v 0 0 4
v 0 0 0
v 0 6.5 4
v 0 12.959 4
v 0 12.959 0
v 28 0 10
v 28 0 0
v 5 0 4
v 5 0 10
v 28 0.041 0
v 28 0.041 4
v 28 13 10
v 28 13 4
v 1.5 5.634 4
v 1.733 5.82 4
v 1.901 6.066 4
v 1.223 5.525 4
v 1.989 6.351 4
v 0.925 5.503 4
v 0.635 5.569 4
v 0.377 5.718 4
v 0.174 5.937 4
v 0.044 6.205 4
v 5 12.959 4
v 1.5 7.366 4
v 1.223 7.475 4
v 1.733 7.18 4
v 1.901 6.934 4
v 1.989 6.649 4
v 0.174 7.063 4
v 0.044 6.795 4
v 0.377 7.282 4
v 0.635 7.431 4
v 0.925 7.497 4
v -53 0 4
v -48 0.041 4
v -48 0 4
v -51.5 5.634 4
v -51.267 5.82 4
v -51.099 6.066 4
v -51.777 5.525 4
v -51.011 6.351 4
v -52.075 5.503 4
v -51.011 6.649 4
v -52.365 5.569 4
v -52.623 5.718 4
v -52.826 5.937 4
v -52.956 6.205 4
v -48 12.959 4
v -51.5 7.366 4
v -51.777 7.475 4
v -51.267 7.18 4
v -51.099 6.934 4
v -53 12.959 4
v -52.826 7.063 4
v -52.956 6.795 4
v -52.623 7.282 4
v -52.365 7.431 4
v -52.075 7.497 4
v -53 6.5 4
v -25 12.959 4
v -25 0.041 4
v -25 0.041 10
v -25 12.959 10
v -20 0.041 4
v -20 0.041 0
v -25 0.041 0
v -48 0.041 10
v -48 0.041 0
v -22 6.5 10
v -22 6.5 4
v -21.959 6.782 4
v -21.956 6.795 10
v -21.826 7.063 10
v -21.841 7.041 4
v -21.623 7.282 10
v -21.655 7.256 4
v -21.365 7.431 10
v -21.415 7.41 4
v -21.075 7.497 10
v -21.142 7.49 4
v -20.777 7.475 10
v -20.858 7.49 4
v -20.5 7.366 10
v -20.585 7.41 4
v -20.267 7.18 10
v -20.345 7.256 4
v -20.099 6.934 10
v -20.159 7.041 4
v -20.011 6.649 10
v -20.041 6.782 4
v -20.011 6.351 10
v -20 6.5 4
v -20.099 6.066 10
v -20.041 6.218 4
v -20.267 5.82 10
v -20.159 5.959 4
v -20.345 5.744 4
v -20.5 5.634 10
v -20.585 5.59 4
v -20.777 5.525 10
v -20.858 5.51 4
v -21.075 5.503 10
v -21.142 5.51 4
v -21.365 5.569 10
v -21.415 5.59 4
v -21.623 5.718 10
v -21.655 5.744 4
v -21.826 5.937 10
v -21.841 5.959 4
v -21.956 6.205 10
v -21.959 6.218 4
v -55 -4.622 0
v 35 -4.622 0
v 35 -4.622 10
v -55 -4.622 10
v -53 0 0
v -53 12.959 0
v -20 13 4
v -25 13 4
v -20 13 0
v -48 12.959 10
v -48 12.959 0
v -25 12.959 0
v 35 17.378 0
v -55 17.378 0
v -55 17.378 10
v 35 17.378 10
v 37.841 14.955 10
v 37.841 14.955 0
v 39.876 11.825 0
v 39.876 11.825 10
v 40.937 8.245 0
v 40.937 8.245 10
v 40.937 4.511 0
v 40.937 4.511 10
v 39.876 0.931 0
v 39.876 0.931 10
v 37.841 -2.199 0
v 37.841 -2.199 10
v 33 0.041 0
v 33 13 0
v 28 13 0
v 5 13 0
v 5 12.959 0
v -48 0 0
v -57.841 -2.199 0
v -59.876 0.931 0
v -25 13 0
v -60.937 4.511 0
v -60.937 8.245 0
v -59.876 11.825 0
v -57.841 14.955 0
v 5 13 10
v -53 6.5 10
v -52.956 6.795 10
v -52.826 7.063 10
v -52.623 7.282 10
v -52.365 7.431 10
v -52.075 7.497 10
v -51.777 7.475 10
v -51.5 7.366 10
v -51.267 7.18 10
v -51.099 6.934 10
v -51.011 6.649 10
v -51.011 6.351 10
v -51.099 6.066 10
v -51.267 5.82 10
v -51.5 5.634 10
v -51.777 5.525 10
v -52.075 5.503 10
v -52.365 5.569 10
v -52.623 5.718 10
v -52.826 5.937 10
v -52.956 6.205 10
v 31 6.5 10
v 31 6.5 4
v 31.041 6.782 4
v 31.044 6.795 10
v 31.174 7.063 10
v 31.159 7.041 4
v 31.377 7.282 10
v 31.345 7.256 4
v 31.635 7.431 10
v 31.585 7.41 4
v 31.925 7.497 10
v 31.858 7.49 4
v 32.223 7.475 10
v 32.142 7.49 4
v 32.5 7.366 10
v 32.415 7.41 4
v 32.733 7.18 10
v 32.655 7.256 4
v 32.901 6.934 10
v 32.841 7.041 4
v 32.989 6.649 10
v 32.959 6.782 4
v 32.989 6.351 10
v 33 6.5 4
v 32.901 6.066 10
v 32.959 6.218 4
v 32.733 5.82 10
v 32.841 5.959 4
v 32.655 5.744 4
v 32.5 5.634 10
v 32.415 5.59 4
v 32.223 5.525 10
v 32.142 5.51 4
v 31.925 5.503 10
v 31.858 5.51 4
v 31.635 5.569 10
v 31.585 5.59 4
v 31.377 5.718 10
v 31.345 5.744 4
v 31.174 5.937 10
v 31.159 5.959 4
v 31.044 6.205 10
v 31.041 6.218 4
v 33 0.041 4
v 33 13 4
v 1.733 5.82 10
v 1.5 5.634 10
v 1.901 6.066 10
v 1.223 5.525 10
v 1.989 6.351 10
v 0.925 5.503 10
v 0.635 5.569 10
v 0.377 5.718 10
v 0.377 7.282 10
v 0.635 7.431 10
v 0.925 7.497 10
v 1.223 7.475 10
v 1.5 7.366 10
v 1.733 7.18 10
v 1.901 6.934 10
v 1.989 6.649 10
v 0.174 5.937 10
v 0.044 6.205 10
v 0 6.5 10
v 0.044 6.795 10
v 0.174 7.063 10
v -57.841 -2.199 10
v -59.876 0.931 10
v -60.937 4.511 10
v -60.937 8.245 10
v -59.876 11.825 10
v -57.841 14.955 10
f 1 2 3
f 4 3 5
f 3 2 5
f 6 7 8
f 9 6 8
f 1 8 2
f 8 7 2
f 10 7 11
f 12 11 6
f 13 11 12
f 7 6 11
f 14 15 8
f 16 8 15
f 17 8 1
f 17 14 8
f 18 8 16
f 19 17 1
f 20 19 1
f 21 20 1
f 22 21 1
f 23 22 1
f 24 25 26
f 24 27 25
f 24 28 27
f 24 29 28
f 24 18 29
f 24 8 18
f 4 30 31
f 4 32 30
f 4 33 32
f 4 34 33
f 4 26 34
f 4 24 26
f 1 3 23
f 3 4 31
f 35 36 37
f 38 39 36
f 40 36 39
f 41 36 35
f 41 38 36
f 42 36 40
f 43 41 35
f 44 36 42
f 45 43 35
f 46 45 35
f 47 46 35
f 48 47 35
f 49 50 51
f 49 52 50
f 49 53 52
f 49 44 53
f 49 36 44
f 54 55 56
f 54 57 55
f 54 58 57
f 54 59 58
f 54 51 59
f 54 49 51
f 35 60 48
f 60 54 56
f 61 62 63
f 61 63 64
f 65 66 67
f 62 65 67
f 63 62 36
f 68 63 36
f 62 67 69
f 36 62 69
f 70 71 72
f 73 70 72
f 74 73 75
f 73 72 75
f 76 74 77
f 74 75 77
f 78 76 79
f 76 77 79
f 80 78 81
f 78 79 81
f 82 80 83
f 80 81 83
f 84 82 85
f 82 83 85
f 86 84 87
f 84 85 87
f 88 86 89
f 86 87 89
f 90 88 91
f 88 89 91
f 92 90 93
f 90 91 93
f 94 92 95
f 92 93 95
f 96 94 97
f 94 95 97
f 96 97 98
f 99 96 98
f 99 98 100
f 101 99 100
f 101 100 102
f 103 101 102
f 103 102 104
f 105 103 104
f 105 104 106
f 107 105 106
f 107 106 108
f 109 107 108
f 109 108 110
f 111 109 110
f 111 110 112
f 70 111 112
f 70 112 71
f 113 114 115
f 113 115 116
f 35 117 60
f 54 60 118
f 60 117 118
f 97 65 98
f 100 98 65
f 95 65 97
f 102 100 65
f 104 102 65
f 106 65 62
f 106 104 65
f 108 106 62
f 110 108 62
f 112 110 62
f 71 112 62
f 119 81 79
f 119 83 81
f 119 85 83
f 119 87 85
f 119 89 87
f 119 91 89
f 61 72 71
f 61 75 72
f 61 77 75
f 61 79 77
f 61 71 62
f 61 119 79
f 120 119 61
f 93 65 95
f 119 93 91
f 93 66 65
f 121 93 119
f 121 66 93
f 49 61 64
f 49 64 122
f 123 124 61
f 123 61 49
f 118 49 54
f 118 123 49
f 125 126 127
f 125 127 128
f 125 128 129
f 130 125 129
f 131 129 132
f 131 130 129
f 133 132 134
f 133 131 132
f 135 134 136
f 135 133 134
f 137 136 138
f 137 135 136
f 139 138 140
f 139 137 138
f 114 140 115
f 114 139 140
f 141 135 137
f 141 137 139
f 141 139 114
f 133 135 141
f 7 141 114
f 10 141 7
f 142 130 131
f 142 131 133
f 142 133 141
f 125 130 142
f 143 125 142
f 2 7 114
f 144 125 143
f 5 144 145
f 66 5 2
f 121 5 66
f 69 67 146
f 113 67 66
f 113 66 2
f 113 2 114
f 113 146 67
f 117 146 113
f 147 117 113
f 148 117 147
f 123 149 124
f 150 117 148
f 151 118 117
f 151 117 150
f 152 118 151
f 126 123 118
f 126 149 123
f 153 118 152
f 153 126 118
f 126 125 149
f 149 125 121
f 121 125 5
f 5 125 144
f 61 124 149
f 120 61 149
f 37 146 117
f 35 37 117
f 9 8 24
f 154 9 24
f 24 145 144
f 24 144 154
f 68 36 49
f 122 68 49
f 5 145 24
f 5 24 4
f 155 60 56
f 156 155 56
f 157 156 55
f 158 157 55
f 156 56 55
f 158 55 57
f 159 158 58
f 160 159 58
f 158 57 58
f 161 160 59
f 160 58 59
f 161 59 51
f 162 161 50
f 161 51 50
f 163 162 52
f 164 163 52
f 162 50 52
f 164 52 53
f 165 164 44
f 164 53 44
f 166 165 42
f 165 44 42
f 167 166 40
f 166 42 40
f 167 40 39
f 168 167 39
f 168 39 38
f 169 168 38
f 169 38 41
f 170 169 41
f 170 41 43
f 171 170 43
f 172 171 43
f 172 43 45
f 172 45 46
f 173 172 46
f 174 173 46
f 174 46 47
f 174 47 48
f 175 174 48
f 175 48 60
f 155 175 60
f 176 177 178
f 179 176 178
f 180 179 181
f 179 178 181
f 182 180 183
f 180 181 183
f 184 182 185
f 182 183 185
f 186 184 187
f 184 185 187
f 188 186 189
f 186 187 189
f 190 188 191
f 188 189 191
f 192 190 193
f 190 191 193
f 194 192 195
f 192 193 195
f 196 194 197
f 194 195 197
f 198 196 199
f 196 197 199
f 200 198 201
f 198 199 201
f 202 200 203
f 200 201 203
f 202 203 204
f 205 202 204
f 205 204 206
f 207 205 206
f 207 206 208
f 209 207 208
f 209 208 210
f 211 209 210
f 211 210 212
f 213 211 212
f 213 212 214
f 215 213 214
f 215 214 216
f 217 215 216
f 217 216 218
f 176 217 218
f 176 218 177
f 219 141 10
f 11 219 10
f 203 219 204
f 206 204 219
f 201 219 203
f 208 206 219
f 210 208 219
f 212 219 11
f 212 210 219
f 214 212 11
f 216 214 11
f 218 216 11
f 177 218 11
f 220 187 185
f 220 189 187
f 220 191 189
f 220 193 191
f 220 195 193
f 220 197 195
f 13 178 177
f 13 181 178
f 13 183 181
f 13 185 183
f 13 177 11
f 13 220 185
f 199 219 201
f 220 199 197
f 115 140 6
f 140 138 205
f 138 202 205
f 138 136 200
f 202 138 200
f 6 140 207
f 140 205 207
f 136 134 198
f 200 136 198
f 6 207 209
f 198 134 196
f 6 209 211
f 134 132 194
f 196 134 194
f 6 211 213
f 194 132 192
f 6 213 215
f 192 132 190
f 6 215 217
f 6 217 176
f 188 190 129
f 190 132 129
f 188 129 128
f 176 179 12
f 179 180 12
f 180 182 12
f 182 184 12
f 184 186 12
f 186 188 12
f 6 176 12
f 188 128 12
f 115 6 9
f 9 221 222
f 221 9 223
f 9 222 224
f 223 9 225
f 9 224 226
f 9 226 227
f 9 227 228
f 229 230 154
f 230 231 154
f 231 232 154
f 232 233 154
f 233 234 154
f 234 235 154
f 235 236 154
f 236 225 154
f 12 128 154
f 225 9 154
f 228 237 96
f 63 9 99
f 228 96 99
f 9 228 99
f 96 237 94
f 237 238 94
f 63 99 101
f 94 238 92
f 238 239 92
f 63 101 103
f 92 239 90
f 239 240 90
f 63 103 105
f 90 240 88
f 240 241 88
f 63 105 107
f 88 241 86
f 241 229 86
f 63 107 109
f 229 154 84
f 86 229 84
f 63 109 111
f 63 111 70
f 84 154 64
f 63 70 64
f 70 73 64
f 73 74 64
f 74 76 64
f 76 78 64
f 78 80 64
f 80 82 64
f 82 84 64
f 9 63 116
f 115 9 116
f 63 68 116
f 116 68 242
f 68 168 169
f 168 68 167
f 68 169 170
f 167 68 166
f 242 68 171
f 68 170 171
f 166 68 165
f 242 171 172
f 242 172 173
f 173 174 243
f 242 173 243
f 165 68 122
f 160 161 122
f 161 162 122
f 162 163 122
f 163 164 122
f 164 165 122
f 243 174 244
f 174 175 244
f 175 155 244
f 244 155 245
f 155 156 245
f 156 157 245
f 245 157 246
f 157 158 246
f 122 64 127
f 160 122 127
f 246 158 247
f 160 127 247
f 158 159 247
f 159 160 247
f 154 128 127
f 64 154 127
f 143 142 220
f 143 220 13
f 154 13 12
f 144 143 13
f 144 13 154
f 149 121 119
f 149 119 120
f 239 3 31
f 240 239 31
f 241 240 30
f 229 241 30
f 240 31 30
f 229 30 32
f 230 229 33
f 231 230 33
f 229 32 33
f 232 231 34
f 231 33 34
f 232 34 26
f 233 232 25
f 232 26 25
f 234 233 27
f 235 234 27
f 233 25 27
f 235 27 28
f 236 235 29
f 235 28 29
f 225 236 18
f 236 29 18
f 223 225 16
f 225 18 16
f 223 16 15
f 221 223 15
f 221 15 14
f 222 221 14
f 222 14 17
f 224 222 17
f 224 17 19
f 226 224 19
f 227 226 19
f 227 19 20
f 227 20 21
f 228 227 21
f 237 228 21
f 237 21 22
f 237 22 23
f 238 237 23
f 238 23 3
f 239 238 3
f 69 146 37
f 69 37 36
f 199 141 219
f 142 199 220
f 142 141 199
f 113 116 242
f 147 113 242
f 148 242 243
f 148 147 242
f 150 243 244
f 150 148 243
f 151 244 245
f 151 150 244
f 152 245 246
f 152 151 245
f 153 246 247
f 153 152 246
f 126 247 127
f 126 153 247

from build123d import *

# Parameters (mm, degrees)
EXTRUDE_2_DEPTH     = 10
SKETCH_2_W          = 5
SKETCH_2_H          = 12.958862493
CUT_EXTRUDE_2_DEPTH = 4
SKETCH_3_W          = 23
SKETCH_3_H          = 13
SKETCH_3_H_2        = 12.917724986
CUT_EXTRUDE_4_DEPTH = 11
SKETCH_4_R          = 1
CUT_EXTRUDE_5_DEPTH = 11


with BuildPart() as part:
    # 草图1 → 凸台-拉伸2 (new body)
    with BuildSketch(Plane.XY):
        with BuildLine():
            Line((-55, 17.378078065), (35, 17.378078065))
            ThreePointArc((35, 17.378078065), (41.07179677, 6.378078065), (35, -4.621921935))
            Line((35, -4.621921935), (-55, -4.621921935))
            ThreePointArc((-55, -4.621921935), (-61.07179677, 6.378078065), (-55, 17.378078065))
        make_face()
    extrude(amount=EXTRUDE_2_DEPTH)

    # 草图2 → 切除-拉伸2 (cut)
    with BuildSketch(Plane(origin=(0, 0, 0), x_dir=(-1, 0, 0), z_dir=(0, 0, -1))):
        with Locations((-30.5, 6.520568754)):
            Rectangle(SKETCH_2_W, SKETCH_2_H)
        with Locations((-2.5, 6.479431247)):
            Rectangle(SKETCH_2_W, SKETCH_2_H)
        with Locations((22.5, 6.520568754)):
            Rectangle(SKETCH_2_W, SKETCH_2_H)
        with Locations((50.5, 6.479431247)):
            Rectangle(SKETCH_2_W, SKETCH_2_H)
    extrude(amount=-CUT_EXTRUDE_2_DEPTH, mode=Mode.SUBTRACT)

    # 草图3 → 切除-拉伸4 (cut, through all)
    with BuildSketch(Plane(origin=(0, 0, 0), x_dir=(-1, 0, 0), z_dir=(0, 0, -1))):
        with Locations((-16.5, 6.5)):
            Rectangle(SKETCH_3_W, SKETCH_3_H)
        with Locations((36.5, 6.5)):
            Rectangle(SKETCH_3_W, SKETCH_3_H_2)
    extrude(amount=-CUT_EXTRUDE_4_DEPTH, mode=Mode.SUBTRACT)

    # 草图4 → 切除-拉伸5 (cut, through all)
    with BuildSketch(Plane(origin=(0, 0, 0), x_dir=(-1, 0, 0), z_dir=(0, 0, -1))):
        with Locations((-32, 6.5)):
            Circle(SKETCH_4_R)
        with Locations((-1, 6.5)):
            Circle(SKETCH_4_R)
        with Locations((21, 6.5)):
            Circle(SKETCH_4_R)
        with Locations((52, 6.5)):
            Circle(SKETCH_4_R)
    extrude(amount=-CUT_EXTRUDE_5_DEPTH, mode=Mode.SUBTRACT)


solid = part.part
